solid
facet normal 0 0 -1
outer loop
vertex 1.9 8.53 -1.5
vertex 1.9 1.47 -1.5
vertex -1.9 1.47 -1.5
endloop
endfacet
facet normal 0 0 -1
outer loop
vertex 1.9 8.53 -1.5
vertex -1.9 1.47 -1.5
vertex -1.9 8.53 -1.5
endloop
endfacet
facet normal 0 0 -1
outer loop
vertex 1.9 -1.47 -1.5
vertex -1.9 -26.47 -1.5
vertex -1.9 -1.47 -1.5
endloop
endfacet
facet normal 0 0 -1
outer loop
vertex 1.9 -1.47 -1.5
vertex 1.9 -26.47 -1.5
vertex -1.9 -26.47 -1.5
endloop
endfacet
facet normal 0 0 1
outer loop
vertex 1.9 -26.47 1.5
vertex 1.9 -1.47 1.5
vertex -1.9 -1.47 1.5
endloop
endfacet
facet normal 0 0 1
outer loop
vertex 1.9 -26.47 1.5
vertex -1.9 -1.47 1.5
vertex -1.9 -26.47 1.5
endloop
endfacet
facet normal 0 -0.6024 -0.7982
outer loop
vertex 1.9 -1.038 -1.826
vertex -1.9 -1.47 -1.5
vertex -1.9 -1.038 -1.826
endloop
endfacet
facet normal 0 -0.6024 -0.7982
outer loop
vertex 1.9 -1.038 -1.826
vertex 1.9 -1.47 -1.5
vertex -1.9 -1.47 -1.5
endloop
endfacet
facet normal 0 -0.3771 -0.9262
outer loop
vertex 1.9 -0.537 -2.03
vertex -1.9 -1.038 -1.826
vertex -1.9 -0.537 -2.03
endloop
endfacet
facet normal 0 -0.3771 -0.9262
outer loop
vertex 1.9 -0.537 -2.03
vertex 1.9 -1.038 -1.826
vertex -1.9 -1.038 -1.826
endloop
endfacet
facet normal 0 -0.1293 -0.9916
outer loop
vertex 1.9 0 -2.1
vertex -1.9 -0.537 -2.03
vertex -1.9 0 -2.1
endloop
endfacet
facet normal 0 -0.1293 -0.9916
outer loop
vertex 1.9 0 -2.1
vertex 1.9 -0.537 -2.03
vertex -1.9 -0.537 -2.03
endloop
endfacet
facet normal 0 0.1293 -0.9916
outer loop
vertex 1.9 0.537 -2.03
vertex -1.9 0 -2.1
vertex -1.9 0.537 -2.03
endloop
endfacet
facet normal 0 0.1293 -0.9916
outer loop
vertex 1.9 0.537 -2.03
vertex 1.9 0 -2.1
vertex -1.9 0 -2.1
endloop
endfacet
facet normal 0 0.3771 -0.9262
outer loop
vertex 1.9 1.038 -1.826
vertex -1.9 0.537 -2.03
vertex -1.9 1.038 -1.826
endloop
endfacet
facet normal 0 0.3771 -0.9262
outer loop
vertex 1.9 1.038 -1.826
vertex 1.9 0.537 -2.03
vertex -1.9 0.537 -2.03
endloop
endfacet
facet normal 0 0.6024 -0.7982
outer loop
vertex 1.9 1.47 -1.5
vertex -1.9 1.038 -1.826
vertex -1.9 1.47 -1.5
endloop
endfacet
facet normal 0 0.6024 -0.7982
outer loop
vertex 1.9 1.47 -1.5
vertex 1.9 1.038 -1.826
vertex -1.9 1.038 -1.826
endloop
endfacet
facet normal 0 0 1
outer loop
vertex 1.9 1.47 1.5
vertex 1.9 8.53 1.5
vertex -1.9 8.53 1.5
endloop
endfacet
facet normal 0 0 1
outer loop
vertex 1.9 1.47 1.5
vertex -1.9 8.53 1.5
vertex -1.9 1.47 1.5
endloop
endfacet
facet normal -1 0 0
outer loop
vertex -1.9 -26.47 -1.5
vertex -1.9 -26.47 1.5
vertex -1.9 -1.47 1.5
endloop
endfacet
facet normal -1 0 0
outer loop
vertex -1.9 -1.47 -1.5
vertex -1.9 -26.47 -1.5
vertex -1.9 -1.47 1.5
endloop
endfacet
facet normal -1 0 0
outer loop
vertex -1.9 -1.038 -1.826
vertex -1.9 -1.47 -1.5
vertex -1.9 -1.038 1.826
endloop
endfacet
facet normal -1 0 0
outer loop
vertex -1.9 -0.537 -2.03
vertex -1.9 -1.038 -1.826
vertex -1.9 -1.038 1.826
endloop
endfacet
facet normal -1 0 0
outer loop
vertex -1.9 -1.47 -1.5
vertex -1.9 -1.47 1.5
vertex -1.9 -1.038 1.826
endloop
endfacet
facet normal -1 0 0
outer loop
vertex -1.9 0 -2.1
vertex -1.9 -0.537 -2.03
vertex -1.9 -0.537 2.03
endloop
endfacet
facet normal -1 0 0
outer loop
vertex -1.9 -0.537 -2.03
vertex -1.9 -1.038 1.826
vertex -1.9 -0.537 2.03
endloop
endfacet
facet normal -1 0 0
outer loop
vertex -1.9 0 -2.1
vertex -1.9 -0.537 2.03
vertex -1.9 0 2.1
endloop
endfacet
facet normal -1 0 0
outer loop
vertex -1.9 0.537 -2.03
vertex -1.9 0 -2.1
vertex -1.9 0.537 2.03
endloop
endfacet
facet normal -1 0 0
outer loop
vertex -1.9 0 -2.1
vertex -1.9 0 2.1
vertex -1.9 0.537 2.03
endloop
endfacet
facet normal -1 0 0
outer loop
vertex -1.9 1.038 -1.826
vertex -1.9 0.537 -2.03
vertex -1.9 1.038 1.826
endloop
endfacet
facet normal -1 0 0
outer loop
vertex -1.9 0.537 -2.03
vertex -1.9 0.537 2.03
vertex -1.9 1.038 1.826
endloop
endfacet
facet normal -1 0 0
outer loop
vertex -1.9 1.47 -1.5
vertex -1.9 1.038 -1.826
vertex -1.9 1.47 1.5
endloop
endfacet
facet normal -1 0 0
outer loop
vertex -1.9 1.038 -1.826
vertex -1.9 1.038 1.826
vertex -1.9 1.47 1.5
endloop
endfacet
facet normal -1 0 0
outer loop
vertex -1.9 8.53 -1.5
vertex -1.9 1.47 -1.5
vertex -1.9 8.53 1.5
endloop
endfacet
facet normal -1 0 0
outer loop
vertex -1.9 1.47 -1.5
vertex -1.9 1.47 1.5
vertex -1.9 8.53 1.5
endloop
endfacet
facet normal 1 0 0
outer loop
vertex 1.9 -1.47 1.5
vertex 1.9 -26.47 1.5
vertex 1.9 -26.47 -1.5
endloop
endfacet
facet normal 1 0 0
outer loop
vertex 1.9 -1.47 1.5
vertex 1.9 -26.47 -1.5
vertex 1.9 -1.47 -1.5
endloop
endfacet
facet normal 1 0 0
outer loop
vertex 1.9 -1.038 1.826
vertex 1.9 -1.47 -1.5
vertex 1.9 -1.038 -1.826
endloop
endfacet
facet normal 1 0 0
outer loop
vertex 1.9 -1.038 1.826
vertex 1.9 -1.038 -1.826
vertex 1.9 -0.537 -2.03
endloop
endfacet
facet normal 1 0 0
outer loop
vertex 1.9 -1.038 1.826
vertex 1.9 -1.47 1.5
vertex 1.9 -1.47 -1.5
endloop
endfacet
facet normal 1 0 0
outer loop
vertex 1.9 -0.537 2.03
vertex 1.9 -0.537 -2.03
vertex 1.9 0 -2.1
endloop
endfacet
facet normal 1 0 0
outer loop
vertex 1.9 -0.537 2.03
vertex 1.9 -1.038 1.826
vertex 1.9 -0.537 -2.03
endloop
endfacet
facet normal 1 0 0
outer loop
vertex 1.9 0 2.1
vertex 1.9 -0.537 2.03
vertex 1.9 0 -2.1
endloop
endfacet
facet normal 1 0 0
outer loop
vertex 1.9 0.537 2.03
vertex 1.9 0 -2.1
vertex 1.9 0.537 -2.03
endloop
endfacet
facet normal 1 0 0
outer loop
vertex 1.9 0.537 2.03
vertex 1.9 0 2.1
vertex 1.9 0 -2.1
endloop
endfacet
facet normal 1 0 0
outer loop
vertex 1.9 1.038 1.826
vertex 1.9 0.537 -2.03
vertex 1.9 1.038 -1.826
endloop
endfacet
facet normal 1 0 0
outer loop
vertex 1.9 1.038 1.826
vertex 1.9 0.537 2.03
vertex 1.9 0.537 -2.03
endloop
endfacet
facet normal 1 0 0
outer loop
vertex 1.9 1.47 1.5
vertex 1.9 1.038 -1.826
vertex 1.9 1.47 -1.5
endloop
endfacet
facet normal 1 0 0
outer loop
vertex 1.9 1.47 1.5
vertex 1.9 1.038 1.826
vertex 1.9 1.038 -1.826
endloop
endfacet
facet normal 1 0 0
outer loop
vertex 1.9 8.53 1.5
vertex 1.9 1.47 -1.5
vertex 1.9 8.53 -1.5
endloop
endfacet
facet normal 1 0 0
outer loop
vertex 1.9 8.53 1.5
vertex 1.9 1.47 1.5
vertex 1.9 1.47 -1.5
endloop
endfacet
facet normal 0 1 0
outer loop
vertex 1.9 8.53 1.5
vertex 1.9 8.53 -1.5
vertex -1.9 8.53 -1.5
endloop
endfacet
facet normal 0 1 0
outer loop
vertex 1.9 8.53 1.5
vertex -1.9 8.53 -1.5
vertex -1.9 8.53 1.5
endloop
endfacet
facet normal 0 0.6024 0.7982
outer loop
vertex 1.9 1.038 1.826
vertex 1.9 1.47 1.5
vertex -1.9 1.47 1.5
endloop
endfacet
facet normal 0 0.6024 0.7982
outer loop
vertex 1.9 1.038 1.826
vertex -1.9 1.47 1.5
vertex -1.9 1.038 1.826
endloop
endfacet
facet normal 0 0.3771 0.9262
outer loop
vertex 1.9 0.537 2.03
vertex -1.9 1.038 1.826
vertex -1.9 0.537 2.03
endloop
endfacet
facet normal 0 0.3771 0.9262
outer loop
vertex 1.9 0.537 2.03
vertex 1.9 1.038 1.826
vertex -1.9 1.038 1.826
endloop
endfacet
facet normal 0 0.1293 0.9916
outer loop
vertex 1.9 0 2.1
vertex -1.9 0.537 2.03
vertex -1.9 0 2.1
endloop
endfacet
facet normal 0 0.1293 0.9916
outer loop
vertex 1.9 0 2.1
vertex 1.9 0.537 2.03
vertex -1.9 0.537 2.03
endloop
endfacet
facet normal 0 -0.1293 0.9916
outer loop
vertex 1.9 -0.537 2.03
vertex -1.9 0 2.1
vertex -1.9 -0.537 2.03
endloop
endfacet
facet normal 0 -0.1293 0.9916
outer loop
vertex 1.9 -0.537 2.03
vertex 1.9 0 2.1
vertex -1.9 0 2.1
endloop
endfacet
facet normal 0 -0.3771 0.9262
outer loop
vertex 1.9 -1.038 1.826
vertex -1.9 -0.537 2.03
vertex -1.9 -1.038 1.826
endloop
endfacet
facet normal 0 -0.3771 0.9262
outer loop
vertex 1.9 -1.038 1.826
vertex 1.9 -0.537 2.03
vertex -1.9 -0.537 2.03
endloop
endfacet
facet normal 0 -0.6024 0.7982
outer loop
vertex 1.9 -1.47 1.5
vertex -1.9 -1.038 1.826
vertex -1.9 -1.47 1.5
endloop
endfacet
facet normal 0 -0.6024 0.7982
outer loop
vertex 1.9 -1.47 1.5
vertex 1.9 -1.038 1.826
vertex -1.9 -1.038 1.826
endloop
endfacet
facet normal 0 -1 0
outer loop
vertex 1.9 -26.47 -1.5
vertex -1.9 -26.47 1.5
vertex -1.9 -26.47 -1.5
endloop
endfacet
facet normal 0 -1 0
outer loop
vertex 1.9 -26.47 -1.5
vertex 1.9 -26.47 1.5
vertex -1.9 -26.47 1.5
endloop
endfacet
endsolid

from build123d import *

# Parameters (mm, degrees)
F0_W          = 3
F0_H          = 3
F1_DEPTH      = 1.9
F1_DEPTH_BACK = 1.9


with BuildPart() as f1:
    # F0 (on Right) → F1 (new body, two sides)
    with BuildSketch(Plane.YZ) as f1_sk:
        with BuildLine():
            Line((1.469694, 1.5), (-1.469694, 1.5))
            ThreePointArc((-1.469694, 1.5), (-2.1, 0), (-1.469694, -1.5))
            Line((-1.469694, -1.5), (1.469694, -1.5))
            ThreePointArc((1.469694, -1.5), (1.936021, -0.813524), (2.1, 0))
            ThreePointArc((2.1, 0), (1.936021, 0.813524), (1.469694, 1.5))
        make_face()
        with BuildLine():
            Line((1.469694, -1.5), (-1.469694, -1.5))
            ThreePointArc((-1.469694, -1.5), (0, -2.1), (1.469694, -1.5))
        make_face()
        with BuildLine():
            Line((5.530306, 1.5), (1.469694, 1.5))
            ThreePointArc((1.469694, 1.5), (1.936021, 0.813524), (2.1, 0))
            ThreePointArc((2.1, 0), (1.936021, -0.813524), (1.469694, -1.5))
            Line((1.469694, -1.5), (5.530306, -1.5))
            Line((5.530306, -1.5), (5.530306, 1.5))
        make_face()
        with Locations((7.030306, 0)):
            Rectangle(F0_W, F0_H)
        with BuildLine():
            ThreePointArc((1.469694, 1.5), (0, 2.1), (-1.469694, 1.5))
            Line((-1.469694, 1.5), (1.469694, 1.5))
        make_face()
        with BuildLine():
            ThreePointArc((-1.469694, -1.5), (-2.1, 0), (-1.469694, 1.5))
            Line((-1.469694, 1.5), (-26.469694, 1.5))
            Line((-26.469694, 1.5), (-26.469694, -1.5))
            Line((-26.469694, -1.5), (-1.469694, -1.5))
        make_face()
    extrude(amount=F1_DEPTH)
    extrude(f1_sk.sketch, amount=-F1_DEPTH_BACK)


solid = f1.part
